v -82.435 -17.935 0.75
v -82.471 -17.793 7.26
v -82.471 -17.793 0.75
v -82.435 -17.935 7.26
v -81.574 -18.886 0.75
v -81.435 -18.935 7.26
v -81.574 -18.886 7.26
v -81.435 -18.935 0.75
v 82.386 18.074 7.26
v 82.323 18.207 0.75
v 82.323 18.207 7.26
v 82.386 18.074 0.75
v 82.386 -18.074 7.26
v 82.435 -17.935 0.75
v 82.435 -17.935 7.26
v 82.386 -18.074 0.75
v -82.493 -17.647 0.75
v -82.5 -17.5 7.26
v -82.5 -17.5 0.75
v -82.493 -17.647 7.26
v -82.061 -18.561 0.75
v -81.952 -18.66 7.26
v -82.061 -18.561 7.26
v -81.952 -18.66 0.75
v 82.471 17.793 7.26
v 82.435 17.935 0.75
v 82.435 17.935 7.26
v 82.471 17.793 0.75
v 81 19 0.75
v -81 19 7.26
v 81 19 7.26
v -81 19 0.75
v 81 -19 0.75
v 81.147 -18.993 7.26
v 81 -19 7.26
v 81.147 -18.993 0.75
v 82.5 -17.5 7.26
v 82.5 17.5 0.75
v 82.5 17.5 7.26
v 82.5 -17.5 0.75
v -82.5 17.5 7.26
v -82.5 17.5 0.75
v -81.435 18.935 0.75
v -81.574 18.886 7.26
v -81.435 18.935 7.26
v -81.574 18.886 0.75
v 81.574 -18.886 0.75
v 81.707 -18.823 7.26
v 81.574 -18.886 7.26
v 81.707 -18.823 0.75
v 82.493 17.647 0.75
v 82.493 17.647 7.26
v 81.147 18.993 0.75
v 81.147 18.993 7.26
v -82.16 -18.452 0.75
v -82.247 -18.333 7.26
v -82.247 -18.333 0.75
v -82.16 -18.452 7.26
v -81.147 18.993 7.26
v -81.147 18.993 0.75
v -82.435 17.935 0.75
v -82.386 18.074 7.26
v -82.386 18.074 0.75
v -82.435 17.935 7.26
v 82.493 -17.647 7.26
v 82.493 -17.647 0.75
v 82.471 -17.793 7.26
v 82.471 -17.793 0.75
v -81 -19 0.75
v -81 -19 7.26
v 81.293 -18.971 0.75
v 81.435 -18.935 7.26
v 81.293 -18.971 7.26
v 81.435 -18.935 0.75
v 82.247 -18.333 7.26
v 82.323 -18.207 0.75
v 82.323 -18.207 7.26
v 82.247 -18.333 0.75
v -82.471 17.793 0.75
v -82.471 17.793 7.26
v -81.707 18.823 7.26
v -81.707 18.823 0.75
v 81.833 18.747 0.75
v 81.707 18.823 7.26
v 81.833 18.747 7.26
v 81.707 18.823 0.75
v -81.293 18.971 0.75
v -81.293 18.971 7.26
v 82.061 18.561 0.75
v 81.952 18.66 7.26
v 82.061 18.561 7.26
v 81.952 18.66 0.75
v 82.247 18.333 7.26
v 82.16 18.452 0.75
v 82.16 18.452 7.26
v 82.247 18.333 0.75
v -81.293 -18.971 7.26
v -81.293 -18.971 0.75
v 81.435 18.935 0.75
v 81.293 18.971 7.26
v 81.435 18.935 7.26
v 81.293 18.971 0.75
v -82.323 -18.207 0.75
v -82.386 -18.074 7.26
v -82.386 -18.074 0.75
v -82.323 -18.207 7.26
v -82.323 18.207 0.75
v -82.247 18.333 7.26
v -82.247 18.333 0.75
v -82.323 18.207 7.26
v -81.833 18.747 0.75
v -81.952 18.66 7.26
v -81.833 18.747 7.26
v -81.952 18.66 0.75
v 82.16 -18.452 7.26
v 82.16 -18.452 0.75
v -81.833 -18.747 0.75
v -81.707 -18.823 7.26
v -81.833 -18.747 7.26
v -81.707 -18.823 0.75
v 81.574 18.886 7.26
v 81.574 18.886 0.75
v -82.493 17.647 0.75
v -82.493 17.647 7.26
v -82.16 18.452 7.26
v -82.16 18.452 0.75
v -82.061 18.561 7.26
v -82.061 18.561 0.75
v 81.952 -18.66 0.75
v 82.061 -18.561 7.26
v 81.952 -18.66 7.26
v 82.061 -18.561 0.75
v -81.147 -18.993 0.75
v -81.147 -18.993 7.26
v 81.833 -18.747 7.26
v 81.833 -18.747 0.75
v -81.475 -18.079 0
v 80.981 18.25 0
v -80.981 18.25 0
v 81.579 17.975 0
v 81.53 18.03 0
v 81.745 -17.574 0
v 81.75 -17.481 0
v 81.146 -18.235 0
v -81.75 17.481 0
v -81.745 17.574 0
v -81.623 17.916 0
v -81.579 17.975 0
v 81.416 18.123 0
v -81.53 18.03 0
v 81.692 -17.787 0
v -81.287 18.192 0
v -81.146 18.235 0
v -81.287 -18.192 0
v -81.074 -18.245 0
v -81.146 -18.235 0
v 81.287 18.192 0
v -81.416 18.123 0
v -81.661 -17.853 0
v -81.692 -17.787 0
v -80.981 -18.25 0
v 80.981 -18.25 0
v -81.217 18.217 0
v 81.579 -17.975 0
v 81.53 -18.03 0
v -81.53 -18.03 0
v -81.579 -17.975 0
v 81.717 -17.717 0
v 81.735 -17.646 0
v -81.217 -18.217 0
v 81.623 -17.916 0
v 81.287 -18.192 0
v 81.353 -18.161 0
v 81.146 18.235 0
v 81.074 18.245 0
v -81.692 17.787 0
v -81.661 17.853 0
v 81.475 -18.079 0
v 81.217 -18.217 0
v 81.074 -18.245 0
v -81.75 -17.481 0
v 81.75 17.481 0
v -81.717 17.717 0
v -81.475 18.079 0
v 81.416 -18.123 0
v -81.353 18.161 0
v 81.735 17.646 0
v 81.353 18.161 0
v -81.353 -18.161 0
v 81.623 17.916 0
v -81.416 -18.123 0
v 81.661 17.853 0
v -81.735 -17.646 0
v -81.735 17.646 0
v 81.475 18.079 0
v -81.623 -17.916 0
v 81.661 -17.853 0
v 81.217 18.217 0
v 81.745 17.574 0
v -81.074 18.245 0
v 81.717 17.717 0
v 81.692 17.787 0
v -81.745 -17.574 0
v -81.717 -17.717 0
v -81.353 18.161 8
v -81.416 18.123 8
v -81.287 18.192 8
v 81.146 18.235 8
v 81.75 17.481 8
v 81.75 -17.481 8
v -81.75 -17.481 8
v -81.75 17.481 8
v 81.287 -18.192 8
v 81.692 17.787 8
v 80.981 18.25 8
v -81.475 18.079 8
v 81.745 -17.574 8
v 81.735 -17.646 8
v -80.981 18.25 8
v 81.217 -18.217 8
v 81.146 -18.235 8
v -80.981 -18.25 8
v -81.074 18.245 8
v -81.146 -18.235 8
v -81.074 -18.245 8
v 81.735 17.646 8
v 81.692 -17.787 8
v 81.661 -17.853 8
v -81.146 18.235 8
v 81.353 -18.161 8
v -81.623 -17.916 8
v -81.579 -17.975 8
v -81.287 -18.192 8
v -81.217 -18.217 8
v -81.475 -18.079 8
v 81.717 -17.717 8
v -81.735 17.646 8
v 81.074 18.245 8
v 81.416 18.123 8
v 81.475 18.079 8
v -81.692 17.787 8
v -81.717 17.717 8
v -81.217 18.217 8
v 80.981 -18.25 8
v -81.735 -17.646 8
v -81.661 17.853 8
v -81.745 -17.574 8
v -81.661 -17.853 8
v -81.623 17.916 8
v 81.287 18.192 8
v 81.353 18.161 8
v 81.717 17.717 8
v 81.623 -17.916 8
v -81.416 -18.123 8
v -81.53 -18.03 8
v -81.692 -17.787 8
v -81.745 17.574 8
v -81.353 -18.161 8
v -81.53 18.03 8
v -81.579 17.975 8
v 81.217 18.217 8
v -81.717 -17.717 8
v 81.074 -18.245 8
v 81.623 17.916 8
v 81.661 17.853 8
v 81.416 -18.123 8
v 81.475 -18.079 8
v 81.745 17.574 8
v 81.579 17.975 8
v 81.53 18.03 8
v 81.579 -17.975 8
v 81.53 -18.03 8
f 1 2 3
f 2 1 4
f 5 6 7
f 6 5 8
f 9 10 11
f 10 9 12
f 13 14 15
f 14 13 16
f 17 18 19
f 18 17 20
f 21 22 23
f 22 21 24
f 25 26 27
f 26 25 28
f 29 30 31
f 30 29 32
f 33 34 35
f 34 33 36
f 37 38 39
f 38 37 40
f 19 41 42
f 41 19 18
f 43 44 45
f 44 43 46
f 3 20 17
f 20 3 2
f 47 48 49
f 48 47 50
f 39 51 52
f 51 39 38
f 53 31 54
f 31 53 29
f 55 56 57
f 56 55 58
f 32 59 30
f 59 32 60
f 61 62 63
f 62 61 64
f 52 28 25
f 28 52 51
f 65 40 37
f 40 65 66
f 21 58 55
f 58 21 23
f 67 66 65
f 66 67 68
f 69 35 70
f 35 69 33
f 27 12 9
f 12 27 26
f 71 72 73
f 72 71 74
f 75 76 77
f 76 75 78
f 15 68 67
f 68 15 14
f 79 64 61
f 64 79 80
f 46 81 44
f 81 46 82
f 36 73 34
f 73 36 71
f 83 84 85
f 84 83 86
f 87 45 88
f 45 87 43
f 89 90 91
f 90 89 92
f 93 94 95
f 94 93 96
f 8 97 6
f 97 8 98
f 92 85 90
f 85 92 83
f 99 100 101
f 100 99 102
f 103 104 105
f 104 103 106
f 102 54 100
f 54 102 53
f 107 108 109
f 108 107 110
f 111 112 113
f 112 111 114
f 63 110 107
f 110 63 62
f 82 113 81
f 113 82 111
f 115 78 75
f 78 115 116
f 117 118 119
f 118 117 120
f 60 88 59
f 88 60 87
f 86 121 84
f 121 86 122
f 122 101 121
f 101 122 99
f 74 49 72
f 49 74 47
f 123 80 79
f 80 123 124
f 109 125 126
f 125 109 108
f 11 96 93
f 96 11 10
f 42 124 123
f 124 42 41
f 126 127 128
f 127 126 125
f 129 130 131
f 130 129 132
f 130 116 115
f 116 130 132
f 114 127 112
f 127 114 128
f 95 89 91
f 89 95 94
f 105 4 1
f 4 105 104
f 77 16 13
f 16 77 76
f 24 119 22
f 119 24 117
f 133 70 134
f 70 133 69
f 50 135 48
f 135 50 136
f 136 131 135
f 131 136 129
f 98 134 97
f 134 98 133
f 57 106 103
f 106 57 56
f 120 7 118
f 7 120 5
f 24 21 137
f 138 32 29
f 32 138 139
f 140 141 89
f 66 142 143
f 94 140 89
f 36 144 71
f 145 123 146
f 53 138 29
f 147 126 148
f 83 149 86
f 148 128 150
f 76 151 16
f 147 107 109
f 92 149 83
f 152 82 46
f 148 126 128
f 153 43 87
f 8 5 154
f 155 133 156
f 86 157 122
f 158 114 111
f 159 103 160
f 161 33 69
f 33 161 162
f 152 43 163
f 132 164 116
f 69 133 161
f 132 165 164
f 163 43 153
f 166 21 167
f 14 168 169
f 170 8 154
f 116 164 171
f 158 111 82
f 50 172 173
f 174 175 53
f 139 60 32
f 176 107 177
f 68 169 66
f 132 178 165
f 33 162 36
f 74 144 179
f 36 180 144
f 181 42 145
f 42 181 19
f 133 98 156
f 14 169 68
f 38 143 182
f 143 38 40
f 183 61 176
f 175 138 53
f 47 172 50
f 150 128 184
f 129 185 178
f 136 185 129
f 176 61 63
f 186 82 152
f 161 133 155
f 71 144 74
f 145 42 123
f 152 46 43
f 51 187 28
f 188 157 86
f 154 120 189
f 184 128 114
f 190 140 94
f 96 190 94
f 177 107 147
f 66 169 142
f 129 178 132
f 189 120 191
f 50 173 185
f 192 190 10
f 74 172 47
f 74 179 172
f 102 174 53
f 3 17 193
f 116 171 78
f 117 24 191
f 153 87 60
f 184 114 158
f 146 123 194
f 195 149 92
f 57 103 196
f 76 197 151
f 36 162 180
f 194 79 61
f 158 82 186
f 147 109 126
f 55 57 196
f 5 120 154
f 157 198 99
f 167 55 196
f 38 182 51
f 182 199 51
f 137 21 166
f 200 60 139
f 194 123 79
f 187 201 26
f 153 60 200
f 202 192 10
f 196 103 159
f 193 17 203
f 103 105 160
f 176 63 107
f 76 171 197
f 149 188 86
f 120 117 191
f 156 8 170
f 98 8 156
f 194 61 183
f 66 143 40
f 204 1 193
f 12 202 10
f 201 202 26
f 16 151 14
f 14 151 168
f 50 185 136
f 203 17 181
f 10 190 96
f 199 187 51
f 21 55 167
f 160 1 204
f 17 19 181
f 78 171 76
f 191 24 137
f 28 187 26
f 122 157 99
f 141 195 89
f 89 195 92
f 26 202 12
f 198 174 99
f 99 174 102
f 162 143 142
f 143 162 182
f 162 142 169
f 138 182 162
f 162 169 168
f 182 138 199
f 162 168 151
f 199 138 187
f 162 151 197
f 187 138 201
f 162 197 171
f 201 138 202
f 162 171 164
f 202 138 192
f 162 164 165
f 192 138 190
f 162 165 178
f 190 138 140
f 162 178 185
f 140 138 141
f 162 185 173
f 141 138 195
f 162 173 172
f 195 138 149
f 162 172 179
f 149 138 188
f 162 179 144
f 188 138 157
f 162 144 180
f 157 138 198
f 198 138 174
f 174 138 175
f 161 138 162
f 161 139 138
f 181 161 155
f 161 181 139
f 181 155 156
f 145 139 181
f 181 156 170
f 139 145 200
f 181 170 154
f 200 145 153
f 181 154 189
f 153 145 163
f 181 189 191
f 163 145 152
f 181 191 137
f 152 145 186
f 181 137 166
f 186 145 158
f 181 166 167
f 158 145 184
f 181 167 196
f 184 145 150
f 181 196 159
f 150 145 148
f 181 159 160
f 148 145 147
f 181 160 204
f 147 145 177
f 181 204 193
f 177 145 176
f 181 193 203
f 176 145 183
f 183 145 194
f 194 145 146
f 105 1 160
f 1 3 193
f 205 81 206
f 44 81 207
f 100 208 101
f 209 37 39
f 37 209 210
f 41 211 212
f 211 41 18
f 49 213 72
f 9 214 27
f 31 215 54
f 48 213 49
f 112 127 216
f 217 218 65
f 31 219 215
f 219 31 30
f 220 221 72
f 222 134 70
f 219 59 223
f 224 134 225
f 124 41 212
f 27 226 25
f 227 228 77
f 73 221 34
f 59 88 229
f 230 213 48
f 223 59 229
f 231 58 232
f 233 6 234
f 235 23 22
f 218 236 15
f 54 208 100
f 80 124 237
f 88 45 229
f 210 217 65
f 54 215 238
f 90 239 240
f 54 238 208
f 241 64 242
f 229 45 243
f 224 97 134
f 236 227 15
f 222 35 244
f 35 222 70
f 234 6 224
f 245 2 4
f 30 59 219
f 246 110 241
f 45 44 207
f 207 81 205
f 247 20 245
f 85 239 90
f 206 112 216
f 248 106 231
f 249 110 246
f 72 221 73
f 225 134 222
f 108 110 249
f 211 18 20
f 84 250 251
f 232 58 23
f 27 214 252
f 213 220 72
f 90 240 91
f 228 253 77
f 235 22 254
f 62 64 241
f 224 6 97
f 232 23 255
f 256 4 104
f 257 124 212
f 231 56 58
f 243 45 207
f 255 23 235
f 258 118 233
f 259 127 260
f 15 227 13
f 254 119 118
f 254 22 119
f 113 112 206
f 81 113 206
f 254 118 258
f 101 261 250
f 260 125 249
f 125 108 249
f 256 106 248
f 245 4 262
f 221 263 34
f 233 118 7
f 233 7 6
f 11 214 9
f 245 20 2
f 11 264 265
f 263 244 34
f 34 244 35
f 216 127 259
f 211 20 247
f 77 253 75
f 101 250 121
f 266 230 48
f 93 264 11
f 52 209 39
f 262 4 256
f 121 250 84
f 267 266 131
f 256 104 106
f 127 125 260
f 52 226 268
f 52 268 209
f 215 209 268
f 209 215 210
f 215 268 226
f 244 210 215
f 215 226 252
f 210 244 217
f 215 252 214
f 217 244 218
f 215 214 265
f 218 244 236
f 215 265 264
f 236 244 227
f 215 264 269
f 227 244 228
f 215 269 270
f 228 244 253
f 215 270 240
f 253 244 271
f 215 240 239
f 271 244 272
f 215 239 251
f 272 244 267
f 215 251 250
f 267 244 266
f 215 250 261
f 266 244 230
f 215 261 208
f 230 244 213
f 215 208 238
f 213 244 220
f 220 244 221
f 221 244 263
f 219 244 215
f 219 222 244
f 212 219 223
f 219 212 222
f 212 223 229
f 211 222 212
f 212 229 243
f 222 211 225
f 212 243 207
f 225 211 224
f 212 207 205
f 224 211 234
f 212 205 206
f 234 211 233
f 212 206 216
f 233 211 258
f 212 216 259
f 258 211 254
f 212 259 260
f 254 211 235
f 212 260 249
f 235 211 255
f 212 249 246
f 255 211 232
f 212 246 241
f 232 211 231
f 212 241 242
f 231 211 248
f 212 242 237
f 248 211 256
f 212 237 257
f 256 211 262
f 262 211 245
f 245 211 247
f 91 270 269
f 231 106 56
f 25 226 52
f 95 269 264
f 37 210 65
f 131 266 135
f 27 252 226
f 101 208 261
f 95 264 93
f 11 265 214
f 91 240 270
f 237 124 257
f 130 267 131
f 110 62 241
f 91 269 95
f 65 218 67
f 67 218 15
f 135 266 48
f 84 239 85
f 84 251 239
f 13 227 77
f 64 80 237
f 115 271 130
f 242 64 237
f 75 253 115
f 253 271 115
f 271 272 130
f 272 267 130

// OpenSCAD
// FS-STRIP-R underfloor body-support strip liner
// J40 rubber recreation 3D model, units: millimetres.
// Generated by tools/generate_rubber_recreation_3d_models.py.
// OpenSCAD is the source model; export STL only after release parameters are set.

$fn = 64;

module rounded_rect_2d(size, r) {
  hull() {
    translate([-(size[0] / 2 - r), -(size[1] / 2 - r)]) circle(r = r);
    translate([ (size[0] / 2 - r), -(size[1] / 2 - r)]) circle(r = r);
    translate([ (size[0] / 2 - r),  (size[1] / 2 - r)]) circle(r = r);
    translate([-(size[0] / 2 - r),  (size[1] / 2 - r)]) circle(r = r);
  }
}

module capsule_2d(length, width) {
  hull() {
    translate([-(length - width) / 2, 0]) circle(d = width);
    translate([ (length - width) / 2, 0]) circle(d = width);
  }
}

module chamfered_extrude(height, edge_chamfer = 0) {
  eps = 0.01;
  if (edge_chamfer <= 0) {
    linear_extrude(height = height, center = false)
      children();
  } else {
    union() {
      translate([0, 0, edge_chamfer])
        linear_extrude(height = height - (2 * edge_chamfer), center = false)
          children();

      hull() {
        translate([0, 0, 0])
          linear_extrude(height = eps, center = false)
            offset(delta = -edge_chamfer)
              children();
        translate([0, 0, edge_chamfer])
          linear_extrude(height = eps, center = false)
            children();
      }

      hull() {
        translate([0, 0, height - edge_chamfer])
          linear_extrude(height = eps, center = false)
            children();
        translate([0, 0, height - eps])
          linear_extrude(height = eps, center = false)
            offset(delta = -edge_chamfer)
              children();
      }
    }
  }
}

// Current order basis:
// - Plain rubber strip 165 x 38 x 8.
// - 3D envelope is length x width x thickness; plan corner radius is 1.5 mm.
// - Top and bottom perimeter edge break/chamfer is modelled at 0.75 mm by default.
// - No holes by default; steel retainer slots belong to the separate retainer
//   unless the actual old rubber proves the rubber itself was pierced.

module fs_strip_r_plain_strip(
  strip_length = 165,
  strip_width = 38,
  strip_thickness = 8,
  corner_r = 1.5,
  edge_chamfer = 0.75,
  hole_d = 0,
  hole_centres = [-62.5, 62.5]
) {
  difference() {
    chamfered_extrude(height = strip_thickness, edge_chamfer = edge_chamfer)
      rounded_rect_2d([strip_length, strip_width], corner_r);

    if (hole_d > 0)
      for (x = hole_centres)
        translate([x, 0, -1])
          cylinder(h = strip_thickness + 2, d = hole_d);
  }
}

fs_strip_r_plain_strip();
